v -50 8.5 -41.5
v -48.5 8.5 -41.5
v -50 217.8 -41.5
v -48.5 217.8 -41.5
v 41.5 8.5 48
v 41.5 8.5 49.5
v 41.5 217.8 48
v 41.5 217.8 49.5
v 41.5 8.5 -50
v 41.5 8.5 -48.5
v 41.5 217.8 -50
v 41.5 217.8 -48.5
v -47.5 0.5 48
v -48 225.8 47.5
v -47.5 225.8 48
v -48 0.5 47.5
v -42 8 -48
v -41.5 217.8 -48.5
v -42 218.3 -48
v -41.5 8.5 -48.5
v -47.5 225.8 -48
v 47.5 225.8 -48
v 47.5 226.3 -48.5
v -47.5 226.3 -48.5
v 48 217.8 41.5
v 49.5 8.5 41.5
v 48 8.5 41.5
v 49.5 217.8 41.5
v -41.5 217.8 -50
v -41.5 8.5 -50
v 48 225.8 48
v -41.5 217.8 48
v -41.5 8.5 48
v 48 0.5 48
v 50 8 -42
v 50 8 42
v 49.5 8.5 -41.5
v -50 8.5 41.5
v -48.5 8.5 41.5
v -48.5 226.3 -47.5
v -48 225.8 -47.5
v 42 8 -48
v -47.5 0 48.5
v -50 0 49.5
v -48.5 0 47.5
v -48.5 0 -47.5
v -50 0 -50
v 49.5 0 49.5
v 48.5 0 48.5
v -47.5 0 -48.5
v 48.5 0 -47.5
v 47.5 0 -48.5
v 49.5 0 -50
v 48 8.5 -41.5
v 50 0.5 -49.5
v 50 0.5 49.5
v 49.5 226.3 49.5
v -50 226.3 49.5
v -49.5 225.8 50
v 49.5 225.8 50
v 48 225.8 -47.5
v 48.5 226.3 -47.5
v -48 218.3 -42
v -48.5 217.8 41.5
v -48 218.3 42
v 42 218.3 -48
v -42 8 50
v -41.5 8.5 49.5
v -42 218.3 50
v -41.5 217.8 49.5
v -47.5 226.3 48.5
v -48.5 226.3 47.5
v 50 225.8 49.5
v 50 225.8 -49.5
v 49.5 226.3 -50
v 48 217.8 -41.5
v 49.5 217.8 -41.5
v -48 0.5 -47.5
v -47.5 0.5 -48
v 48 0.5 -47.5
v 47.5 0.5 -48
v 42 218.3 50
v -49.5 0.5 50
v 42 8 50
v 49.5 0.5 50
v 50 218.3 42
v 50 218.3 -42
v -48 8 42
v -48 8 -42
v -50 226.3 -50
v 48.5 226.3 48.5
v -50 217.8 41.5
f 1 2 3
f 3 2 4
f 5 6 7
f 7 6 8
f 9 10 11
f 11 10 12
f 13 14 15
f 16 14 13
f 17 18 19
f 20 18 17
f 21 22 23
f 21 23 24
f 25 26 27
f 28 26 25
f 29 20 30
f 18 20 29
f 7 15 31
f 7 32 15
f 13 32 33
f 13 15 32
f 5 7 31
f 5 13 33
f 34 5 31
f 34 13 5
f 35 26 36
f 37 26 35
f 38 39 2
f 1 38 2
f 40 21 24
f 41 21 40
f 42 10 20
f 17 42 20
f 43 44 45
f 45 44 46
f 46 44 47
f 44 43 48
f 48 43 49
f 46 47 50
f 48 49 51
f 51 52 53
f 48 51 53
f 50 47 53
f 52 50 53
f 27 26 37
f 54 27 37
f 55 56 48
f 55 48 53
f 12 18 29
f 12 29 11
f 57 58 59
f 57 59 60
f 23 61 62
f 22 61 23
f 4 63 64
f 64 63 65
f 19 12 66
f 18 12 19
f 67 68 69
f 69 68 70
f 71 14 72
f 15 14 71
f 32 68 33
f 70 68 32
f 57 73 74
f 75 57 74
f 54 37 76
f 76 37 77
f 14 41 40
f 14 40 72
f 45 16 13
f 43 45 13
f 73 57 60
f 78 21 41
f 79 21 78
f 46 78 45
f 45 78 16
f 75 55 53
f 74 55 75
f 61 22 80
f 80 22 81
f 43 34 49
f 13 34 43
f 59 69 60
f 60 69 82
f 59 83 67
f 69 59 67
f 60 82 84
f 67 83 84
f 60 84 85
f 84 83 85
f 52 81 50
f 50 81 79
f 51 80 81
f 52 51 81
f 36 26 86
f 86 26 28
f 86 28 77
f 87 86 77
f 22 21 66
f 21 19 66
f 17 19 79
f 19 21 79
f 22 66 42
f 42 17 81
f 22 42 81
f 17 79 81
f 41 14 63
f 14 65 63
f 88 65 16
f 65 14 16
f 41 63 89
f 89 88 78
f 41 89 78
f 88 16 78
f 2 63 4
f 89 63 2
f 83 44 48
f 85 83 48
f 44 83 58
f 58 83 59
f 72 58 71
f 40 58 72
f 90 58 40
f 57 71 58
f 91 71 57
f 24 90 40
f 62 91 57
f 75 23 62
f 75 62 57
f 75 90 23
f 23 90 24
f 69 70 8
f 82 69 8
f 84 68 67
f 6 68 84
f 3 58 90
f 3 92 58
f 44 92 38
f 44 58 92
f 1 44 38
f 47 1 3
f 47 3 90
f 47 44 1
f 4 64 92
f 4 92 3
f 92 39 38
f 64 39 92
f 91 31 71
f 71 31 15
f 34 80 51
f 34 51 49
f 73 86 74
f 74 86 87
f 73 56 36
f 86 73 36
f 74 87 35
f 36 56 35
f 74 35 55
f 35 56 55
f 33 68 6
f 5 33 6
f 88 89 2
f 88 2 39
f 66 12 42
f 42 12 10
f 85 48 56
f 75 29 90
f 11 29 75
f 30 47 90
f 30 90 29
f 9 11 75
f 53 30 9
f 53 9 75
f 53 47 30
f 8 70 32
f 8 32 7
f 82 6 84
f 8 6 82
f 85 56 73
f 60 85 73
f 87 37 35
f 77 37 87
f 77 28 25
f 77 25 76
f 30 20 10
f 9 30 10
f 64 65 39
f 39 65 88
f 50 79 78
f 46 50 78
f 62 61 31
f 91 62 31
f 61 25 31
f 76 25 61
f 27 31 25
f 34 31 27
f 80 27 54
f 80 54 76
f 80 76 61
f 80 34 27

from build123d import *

# Parameters (mm, degrees)
SKETCH2_W           = 100
SKETCH2_H           = 100
BOSS_EXTRUDE1_DEPTH = 226.3
SHELL1_T            = -2
SKETCH3_W           = 83
SKETCH3_H           = 209.3
CUT_EXTRUDE1_DEPTH  = 253.411746953
SKETCH5_W           = 83
SKETCH5_H           = 209.3
CUT_EXTRUDE2_DEPTH  = 253.411746953
CHAMFER1_SIZE       = 0.5


with BuildPart() as part:
    # Sketch2 → Boss-Extrude1 (new body)
    with BuildSketch(Plane(origin=(0, 0, 0), x_dir=(1, 0, 0), z_dir=(0, 1, 0))):
        Rectangle(SKETCH2_W, SKETCH2_H)
    extrude(amount=BOSS_EXTRUDE1_DEPTH)

    # Shell1
    shell1_openings = [part.faces().sort_by_distance(p)[0] for p in [
        (0, 226.3, 0),
        (0, 0, 0),
    ]]
    offset(amount=SHELL1_T, openings=shell1_openings, kind=Kind.INTERSECTION)

    # Sketch3 → Cut-Extrude1 (cut, through all)
    with BuildSketch(Plane.XY.offset(50)):
        with Locations((0, 113.15)):
            Rectangle(SKETCH3_W, SKETCH3_H)
    extrude(amount=-CUT_EXTRUDE1_DEPTH, mode=Mode.SUBTRACT)

    # Sketch5 → Cut-Extrude2 (cut, through all)
    with BuildSketch(Plane(origin=(50, 0, 0), x_dir=(0, 0, -1), z_dir=(1, 0, 0))):
        with Locations((0, 113.15)):
            Rectangle(SKETCH5_W, SKETCH5_H)
    extrude(amount=-CUT_EXTRUDE2_DEPTH, mode=Mode.SUBTRACT)

    # Chamfer1
    chamfer1_edges = [part.edges().sort_by_distance(p)[0] for p in [
        (0, 226.3, 50),
        (48, 0, 0),
        (0, 0, -48),
        (48, 113.15, -48),
        (-48, 0, 0),
        (-48, 113.15, -48),
        (0, 0, 48),
        (-48, 113.15, 48),
        (48, 226.3, 0),
        (0, 226.3, -48),
        (-48, 226.3, 0),
        (0, 226.3, 48),
        (41.5, 113.15, -48),
        (0, 8.5, -48),
        (-41.5, 113.15, -48),
        (0, 217.8, -48),
        (41.5, 113.15, 50),
        (0, 217.8, 50),
        (-41.5, 113.15, 50),
        (0, 8.5, 50),
        (50, 226.3, 0),
        (0, 0, 50),
        (-48, 217.8, 0),
        (-48, 113.15, 41.5),
        (-48, 8.5, 0),
        (-48, 113.15, -41.5),
        (50, 0, 0),
        (50, 113.15, -41.5),
        (50, 217.8, 0),
        (50, 113.15, 41.5),
        (50, 8.5, 0),
        (50, 113.15, 50),
        (-50, 113.15, 50),
        (50, 113.15, -50),
    ]]
    chamfer(chamfer1_edges, length=CHAMFER1_SIZE)


solid = part.part
